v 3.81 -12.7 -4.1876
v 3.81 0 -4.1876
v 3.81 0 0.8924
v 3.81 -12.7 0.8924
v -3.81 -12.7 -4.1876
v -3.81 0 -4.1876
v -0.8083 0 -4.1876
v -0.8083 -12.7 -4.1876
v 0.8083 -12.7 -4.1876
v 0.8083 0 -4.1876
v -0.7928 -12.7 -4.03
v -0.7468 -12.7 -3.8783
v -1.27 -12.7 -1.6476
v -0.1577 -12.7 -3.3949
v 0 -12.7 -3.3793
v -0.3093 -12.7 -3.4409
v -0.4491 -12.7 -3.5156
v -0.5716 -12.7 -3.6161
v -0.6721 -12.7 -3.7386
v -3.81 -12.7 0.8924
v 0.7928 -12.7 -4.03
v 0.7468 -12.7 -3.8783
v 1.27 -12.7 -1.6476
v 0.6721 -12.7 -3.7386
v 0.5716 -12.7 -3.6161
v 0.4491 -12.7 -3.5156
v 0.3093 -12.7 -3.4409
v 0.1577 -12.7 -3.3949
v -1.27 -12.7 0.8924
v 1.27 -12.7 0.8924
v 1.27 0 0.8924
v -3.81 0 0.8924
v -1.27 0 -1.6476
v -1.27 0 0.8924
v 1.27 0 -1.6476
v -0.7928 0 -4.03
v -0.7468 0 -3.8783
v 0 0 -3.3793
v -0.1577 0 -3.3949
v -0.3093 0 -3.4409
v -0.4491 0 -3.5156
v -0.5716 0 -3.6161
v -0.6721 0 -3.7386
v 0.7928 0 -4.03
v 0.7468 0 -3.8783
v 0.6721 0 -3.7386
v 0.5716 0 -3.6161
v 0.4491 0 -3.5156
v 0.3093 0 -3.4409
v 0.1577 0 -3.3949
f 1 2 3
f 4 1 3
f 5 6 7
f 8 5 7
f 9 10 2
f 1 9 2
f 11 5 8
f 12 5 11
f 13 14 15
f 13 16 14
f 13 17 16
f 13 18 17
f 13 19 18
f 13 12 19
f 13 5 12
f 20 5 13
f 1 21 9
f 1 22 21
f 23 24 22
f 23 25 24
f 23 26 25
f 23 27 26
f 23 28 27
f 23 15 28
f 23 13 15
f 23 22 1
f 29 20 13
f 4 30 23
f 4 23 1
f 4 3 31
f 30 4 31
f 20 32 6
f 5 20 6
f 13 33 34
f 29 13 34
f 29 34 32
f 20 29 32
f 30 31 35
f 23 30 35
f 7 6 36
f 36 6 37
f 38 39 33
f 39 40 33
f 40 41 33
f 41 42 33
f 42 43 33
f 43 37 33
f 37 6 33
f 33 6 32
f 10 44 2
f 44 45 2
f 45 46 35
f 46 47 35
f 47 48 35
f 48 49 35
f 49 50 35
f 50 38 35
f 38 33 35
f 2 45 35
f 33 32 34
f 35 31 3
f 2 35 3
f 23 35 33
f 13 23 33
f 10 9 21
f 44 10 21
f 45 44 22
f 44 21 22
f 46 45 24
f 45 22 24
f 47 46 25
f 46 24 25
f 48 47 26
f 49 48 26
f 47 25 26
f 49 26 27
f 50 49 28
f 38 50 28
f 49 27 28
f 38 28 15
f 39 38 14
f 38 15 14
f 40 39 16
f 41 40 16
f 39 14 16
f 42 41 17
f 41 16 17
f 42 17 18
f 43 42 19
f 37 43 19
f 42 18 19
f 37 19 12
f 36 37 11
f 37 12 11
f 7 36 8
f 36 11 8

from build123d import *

# Parameters (mm, degrees)
F1_DEPTH = 12.7
F2_R     = 0.808299
F3_DEPTH = 25.4


with BuildPart() as f1:
    # F0 (on Front) → F1 (new body)
    with BuildSketch(Plane.XZ):
        Polygon((-1.27, 0.892354), (-3.81, 0.892354), (-3.81, -4.187646), (3.81, -4.187646), (3.81, 0.892354), (1.27, 0.892354), (1.27, -1.647646), (-1.27, -1.647646), align=None)
    extrude(amount=F1_DEPTH)

    # F2 (on face) → F3 (cut)
    with BuildSketch(Plane.XZ.offset(12.7)):
        with Locations((0, -4.187646)):
            Circle(F2_R)
    extrude(amount=-F3_DEPTH, mode=Mode.SUBTRACT)


solid = f1.part
